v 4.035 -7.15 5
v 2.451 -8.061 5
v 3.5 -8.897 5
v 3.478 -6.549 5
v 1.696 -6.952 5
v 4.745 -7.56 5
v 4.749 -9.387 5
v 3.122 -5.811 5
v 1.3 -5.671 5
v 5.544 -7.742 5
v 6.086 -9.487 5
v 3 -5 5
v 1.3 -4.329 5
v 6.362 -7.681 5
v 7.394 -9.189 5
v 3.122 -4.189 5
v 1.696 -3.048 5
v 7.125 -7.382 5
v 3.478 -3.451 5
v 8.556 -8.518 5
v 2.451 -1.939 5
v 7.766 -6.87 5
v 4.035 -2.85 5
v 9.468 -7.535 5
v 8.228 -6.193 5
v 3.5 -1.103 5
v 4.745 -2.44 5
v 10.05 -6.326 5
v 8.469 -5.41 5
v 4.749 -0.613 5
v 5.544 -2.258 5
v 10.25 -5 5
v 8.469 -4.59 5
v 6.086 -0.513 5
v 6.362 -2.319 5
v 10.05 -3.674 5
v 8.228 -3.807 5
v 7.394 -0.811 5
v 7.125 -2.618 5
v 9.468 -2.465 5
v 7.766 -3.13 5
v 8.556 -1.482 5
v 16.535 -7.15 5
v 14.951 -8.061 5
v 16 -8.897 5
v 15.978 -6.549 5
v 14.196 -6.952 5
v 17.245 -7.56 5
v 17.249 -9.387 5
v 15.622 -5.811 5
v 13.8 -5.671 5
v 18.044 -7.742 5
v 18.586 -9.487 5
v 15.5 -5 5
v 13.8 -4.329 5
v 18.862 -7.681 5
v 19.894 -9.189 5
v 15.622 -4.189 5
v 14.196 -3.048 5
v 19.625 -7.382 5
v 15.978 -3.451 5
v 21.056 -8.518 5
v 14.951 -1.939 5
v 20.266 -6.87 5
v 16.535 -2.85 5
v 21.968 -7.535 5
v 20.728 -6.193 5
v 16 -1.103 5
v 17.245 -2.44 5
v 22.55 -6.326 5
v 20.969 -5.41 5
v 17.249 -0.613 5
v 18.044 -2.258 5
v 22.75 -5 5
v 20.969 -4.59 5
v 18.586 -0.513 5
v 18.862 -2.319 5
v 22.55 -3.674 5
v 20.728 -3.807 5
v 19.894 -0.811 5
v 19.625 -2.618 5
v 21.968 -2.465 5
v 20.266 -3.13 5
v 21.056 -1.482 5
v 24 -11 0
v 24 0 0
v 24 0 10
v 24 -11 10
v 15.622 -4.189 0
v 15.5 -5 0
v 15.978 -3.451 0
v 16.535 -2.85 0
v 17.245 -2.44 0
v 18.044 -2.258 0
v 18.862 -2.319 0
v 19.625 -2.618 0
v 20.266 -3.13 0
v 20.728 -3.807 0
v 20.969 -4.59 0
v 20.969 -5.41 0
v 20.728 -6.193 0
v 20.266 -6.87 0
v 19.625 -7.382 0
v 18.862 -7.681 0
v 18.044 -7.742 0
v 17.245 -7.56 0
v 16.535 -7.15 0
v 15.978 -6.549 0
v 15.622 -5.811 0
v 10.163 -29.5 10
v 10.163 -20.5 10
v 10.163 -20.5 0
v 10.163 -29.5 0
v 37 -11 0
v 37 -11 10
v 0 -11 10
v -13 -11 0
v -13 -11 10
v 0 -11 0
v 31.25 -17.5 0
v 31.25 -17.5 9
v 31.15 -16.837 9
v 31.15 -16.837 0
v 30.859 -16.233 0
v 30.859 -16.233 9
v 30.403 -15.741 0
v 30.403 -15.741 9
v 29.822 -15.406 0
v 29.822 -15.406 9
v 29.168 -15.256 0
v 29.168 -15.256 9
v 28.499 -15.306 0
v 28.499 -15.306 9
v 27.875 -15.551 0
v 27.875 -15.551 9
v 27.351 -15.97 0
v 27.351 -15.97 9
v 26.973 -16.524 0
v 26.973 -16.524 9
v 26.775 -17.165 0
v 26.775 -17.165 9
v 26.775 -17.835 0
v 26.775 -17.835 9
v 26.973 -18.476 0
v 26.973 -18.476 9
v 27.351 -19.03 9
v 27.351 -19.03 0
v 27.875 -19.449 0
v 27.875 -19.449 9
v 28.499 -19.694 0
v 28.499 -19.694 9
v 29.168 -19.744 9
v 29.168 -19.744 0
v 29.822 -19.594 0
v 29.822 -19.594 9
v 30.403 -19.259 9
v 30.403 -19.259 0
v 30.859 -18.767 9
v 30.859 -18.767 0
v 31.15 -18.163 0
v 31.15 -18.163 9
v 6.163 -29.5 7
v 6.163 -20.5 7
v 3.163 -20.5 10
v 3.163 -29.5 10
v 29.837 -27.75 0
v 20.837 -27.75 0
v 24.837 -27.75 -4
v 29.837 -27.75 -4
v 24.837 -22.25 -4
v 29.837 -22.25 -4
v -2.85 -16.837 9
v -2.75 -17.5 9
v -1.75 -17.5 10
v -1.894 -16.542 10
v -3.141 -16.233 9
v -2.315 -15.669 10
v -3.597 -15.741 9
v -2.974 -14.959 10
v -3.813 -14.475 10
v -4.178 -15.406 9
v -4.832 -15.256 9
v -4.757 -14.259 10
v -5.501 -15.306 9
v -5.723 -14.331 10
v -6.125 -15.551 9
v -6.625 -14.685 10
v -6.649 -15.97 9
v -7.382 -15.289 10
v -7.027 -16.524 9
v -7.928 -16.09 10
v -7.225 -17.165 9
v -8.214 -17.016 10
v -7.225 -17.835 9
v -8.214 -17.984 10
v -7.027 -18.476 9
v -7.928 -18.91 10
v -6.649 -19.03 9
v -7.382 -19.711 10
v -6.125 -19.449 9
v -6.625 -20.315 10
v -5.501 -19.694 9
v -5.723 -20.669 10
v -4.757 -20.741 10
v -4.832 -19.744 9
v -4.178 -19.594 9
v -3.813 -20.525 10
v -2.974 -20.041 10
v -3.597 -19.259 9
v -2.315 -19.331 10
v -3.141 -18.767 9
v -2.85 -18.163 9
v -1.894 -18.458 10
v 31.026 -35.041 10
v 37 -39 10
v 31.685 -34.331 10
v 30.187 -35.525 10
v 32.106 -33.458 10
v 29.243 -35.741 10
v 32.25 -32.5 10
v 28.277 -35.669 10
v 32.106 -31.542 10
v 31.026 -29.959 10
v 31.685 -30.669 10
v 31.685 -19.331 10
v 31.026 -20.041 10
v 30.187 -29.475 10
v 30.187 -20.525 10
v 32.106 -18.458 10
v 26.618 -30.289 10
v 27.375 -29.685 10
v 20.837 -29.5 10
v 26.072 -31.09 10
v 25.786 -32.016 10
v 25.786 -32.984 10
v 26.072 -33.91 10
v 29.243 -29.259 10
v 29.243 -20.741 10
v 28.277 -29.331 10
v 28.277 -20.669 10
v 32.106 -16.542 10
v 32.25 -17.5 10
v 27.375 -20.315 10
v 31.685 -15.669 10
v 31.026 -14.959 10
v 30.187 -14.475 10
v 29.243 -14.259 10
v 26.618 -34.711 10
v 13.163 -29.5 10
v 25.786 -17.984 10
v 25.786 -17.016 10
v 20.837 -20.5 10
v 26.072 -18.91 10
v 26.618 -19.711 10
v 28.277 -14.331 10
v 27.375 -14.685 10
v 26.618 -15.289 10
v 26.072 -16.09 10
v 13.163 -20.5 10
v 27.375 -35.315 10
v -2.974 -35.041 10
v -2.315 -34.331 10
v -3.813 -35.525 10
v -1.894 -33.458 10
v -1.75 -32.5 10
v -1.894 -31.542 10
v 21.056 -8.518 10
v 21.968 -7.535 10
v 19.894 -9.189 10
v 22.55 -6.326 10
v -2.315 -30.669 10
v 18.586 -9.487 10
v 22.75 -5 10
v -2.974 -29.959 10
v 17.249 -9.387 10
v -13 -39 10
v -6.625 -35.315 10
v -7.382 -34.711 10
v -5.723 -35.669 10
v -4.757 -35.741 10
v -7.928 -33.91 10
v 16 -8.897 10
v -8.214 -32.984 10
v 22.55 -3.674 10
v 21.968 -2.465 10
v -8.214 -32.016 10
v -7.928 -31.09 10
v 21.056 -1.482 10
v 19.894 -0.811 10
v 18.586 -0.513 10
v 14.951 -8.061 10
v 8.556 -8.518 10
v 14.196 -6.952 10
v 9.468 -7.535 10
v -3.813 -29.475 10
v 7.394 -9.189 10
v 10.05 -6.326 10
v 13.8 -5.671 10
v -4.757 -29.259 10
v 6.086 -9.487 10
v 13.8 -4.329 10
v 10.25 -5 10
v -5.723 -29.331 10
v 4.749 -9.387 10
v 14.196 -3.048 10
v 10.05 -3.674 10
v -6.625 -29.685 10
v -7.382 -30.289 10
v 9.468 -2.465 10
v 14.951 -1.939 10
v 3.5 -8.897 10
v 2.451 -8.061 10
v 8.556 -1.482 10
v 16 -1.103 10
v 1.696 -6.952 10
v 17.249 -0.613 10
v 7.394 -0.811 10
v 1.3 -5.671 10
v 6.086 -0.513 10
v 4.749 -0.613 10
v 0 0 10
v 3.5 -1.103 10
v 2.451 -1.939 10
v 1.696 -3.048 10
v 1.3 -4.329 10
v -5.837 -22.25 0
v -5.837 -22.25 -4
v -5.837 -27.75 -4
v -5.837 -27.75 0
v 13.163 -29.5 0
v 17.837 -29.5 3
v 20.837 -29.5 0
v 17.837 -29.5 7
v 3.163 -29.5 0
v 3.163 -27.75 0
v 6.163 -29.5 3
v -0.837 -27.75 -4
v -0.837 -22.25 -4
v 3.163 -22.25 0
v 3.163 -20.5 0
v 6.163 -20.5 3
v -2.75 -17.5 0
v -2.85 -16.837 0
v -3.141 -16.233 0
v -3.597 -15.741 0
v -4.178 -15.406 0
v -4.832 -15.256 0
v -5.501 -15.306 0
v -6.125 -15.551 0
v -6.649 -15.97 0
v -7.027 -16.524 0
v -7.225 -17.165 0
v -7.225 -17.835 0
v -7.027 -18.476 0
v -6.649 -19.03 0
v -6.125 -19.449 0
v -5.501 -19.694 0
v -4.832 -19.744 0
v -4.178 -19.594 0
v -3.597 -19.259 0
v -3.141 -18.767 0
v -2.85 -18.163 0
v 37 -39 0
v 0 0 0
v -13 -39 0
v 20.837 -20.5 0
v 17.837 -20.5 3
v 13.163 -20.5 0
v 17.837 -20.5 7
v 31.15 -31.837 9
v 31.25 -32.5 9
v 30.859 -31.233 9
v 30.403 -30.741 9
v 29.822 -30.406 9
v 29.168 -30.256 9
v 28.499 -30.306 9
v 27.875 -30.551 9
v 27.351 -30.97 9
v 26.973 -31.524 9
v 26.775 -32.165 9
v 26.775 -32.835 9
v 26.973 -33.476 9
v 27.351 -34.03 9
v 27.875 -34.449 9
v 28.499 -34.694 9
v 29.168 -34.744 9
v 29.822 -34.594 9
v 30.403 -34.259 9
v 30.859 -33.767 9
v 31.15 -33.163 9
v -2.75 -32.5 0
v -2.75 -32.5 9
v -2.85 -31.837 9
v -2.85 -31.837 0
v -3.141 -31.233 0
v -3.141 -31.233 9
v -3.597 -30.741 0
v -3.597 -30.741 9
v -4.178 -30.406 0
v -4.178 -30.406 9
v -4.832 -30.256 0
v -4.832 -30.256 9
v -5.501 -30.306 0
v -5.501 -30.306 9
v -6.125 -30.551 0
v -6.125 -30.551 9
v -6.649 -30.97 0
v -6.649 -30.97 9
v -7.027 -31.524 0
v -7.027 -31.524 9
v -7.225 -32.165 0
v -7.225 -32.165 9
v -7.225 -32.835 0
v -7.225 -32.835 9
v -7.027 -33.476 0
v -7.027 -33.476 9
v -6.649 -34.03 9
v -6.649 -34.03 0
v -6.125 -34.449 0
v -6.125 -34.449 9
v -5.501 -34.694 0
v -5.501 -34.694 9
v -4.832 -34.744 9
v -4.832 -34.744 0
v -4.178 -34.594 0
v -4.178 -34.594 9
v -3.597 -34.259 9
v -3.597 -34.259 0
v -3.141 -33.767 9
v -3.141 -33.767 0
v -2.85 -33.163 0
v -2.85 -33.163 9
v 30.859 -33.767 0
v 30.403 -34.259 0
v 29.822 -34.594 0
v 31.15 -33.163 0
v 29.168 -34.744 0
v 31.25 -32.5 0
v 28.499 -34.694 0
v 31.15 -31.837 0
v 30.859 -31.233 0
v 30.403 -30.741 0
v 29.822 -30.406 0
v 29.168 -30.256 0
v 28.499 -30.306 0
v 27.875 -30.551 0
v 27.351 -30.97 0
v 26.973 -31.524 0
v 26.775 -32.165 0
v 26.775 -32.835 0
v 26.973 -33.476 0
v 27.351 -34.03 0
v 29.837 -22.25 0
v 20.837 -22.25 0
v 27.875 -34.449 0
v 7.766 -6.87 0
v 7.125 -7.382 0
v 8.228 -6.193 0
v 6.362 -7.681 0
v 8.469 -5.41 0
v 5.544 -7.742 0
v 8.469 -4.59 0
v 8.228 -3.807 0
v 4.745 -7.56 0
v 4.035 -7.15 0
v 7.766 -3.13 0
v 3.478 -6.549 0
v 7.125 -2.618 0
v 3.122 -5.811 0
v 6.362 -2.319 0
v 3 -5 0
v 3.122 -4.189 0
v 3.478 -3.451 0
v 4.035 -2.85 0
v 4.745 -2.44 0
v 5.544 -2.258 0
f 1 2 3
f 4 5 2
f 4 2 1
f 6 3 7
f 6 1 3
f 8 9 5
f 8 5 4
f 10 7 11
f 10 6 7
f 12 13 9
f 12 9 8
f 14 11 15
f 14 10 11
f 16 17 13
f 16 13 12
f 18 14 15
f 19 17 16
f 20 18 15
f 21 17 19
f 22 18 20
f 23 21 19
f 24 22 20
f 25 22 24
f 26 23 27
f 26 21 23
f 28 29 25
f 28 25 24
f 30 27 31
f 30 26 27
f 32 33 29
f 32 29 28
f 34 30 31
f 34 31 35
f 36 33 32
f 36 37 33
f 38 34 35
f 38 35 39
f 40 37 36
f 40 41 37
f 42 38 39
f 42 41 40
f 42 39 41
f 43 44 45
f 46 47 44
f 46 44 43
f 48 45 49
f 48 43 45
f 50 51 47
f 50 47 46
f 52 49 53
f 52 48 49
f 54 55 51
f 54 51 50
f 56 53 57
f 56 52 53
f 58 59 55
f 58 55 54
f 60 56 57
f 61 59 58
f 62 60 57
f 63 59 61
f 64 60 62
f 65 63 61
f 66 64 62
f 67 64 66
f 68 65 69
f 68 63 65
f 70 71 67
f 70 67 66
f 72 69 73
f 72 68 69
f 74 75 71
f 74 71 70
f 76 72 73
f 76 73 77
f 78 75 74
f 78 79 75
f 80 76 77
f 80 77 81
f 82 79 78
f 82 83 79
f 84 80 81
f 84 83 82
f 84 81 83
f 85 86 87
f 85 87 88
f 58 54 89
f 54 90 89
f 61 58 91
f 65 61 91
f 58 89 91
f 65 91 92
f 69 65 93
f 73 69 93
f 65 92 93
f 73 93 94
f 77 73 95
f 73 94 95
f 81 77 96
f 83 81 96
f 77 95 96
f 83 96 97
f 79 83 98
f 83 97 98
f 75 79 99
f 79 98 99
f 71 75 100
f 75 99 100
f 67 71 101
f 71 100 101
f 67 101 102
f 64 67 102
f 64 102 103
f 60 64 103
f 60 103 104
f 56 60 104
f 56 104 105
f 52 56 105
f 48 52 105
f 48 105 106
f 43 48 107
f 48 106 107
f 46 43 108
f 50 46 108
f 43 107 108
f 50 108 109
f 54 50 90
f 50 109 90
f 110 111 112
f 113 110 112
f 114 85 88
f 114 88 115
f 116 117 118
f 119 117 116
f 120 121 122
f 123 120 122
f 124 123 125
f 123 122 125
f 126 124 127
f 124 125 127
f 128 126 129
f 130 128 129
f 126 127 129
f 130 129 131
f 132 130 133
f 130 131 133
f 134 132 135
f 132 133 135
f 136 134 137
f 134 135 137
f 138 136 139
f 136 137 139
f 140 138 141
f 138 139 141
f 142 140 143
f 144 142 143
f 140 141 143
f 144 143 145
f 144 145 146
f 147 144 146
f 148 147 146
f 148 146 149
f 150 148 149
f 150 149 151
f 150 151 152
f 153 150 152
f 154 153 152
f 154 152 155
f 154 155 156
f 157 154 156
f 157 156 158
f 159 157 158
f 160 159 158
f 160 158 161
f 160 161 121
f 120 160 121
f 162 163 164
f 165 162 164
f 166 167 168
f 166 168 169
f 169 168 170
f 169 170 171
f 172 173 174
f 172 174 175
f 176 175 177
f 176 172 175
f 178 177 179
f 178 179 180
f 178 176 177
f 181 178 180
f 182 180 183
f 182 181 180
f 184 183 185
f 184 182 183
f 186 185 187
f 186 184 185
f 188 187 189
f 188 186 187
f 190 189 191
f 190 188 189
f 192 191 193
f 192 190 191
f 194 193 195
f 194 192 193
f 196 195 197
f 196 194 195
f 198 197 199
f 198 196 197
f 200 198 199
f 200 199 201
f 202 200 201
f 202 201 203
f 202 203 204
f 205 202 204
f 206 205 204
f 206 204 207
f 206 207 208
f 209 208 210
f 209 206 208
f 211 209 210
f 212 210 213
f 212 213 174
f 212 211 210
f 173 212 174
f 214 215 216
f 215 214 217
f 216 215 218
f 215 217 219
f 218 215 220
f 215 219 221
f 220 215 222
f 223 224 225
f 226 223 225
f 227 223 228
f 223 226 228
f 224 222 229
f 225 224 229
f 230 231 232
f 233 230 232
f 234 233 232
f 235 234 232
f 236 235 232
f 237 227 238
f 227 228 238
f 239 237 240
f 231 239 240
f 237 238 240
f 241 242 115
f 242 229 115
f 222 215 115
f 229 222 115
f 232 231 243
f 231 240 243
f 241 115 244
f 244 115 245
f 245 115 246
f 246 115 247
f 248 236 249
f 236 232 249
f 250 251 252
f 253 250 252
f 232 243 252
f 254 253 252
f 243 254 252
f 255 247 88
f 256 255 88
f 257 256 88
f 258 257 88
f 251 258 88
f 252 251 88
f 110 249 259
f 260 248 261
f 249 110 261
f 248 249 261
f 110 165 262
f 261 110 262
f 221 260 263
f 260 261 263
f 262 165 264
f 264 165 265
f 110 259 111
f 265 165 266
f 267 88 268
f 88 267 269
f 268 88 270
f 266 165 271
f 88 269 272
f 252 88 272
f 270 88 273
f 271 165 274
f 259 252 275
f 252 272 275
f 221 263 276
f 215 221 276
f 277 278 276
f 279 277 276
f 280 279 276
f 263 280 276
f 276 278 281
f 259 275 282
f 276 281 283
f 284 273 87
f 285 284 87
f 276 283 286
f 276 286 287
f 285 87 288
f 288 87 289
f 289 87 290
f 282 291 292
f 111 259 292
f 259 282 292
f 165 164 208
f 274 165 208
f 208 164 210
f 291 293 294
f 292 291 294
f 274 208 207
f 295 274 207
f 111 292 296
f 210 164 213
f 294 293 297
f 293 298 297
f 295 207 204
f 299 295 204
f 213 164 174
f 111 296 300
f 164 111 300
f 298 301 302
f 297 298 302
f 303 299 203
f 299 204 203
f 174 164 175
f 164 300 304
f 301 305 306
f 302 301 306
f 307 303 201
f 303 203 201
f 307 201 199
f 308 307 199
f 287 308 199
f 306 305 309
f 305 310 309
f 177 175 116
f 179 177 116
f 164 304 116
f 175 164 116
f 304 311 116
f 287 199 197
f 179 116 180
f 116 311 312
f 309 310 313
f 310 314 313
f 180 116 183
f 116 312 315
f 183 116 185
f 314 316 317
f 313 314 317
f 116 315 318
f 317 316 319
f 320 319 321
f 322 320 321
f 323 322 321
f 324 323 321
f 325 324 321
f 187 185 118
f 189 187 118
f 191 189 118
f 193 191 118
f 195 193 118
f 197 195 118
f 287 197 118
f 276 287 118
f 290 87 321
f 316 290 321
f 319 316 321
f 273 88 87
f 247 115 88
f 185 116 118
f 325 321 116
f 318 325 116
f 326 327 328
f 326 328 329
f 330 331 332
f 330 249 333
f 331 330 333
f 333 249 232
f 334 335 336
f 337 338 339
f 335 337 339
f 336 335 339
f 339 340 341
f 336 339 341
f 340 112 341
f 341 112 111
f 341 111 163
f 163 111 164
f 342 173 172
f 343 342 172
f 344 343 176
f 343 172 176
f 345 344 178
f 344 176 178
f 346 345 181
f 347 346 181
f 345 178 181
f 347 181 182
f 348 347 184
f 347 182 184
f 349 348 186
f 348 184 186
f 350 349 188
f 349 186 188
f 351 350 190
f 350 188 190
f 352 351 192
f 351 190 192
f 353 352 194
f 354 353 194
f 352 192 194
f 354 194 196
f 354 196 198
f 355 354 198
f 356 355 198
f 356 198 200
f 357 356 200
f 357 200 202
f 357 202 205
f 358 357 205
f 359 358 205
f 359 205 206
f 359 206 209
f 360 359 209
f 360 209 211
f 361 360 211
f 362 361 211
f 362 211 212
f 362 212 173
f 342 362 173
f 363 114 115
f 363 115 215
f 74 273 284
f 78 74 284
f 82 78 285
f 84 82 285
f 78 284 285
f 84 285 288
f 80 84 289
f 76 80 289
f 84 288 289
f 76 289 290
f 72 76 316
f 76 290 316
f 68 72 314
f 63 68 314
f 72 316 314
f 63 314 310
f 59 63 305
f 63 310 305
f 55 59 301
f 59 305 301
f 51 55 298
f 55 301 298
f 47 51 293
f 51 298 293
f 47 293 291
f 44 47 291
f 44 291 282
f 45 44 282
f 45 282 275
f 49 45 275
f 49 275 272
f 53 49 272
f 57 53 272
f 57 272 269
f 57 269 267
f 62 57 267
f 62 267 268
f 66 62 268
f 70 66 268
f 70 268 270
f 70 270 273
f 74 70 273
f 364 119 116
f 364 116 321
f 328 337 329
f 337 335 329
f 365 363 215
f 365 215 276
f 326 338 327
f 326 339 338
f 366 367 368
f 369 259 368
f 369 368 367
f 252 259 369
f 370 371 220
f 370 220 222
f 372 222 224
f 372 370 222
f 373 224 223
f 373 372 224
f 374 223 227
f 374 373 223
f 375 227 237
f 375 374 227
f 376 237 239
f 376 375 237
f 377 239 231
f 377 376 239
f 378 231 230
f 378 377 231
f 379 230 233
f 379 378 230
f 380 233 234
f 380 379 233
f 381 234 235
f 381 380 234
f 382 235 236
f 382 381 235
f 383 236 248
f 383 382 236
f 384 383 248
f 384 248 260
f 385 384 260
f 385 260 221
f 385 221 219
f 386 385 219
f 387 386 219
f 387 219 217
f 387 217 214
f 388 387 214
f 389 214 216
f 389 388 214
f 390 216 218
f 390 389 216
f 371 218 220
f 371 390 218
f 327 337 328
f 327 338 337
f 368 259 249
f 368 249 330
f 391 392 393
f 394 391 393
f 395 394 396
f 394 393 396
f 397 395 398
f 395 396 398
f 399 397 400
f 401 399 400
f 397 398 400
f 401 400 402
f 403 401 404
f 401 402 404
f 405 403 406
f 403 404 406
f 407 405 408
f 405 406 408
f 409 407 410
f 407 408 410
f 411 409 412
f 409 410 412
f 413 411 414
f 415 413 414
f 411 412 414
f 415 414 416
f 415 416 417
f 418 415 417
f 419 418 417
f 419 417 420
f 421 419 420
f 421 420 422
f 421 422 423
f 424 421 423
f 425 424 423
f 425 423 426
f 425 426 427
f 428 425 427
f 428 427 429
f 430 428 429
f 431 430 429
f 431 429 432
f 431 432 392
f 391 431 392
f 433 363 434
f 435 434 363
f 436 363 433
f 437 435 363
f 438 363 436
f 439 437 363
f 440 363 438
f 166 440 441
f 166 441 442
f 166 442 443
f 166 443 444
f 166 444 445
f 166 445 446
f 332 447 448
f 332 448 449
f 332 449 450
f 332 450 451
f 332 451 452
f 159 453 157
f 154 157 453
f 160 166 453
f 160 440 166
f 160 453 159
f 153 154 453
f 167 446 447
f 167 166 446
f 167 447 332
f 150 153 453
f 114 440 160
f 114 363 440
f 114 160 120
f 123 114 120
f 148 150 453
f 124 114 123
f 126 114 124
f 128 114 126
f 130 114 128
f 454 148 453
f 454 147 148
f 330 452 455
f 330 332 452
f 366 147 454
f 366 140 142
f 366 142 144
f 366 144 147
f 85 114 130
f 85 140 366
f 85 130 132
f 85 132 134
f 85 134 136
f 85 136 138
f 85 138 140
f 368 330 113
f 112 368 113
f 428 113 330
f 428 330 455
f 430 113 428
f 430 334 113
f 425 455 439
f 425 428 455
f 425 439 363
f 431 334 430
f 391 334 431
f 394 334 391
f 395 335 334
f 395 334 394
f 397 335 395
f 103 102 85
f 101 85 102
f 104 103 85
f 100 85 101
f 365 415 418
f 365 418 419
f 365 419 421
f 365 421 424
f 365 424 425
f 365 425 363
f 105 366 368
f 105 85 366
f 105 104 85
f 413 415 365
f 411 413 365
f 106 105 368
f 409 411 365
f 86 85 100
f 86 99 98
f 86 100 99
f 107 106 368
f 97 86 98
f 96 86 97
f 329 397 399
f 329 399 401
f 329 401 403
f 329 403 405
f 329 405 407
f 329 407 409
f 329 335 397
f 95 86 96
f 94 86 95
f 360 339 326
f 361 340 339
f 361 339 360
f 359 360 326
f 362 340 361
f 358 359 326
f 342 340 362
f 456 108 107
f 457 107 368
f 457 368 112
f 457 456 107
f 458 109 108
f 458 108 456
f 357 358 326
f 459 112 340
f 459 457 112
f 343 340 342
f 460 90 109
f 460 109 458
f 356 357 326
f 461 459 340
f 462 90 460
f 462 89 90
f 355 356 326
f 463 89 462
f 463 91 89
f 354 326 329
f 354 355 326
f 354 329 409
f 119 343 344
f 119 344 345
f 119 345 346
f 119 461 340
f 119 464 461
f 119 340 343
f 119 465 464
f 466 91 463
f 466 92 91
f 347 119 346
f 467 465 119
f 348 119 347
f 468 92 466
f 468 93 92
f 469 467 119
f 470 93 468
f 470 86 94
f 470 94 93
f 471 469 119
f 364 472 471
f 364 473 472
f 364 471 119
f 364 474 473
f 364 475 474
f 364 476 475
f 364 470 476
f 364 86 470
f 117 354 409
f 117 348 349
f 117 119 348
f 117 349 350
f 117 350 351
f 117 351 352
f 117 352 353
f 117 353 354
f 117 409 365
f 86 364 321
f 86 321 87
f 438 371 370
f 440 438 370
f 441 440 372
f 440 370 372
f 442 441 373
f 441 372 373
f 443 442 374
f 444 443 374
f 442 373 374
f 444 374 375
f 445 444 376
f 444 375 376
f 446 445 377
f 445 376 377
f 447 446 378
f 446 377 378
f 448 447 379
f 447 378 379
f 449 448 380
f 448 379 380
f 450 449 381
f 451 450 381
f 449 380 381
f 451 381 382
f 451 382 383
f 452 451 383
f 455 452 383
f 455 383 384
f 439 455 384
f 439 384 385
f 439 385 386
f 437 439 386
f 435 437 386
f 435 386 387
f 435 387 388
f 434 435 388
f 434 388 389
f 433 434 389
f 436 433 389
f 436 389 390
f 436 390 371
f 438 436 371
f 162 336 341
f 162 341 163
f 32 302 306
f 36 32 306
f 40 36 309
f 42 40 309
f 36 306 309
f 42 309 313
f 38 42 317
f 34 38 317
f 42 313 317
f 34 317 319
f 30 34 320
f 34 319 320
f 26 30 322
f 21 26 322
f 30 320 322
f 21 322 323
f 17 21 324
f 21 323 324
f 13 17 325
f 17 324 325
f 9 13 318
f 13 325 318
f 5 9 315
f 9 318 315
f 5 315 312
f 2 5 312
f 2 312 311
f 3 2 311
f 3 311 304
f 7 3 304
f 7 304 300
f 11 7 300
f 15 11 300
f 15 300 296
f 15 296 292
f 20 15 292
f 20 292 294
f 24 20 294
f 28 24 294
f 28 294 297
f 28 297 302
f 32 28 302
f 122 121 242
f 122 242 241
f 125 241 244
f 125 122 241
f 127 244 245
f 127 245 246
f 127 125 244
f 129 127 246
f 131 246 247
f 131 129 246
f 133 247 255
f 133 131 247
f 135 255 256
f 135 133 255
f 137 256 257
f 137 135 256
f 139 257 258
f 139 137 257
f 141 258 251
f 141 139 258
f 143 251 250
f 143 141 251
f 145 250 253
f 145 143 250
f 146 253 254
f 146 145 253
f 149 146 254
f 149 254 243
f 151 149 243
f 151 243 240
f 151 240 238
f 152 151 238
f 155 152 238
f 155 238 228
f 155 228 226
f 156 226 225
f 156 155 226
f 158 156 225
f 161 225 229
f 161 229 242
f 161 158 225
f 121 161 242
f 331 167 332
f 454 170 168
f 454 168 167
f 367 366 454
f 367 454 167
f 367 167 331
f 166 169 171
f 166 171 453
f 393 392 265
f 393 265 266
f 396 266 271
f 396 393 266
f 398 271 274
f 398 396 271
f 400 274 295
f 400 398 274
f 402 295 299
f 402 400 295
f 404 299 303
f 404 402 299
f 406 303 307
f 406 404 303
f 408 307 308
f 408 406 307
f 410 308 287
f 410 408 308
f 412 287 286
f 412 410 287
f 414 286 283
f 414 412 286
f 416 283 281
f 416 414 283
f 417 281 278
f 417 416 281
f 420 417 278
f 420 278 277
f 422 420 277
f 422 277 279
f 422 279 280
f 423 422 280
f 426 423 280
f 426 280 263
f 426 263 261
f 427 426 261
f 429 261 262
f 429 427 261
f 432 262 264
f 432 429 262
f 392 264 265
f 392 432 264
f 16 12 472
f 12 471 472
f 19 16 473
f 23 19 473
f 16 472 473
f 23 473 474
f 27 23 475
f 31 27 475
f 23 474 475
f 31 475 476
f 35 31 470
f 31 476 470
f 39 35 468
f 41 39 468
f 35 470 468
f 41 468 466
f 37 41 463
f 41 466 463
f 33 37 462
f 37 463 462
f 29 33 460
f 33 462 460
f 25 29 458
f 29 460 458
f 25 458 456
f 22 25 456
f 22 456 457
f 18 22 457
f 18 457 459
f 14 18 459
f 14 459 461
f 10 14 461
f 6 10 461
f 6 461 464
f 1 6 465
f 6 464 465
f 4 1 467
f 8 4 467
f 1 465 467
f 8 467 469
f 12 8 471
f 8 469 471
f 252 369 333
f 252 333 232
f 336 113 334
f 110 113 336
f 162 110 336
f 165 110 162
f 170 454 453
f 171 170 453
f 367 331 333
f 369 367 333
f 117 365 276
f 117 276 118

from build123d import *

# Parameters (mm, degrees)
PAD_DEPTH        = 10
HOLE_D           = 5.5
HOLE_CBORE_D     = 9
HOLE_CBORE_DEPTH = 5
POCKET_DEPTH     = 9
SKETCH004_R      = 2.25
HOLE001_DEPTH    = 10.001
CHAMFER_SIZE     = 1
PAD001_DEPTH     = 2.75


with BuildPart() as part:
    # Sketch → Pad (new body)
    with BuildSketch(Plane.XY):
        Polygon((0, 0), (24, 0), (24, -11), (37, -11), (37, -39), (-13, -39), (-13, -11), (0, -11), align=None)
    extrude(amount=PAD_DEPTH)

    # Hole (through all)
    with Locations(Plane.XY.offset(10)):
        with Locations((5.75, -5), (18.25, -5)):
            CounterBoreHole(HOLE_D / 2, HOLE_CBORE_D / 2, HOLE_CBORE_DEPTH)

    # Sketch003 (on Face6 of Hole) → Pocket (cut)
    with BuildSketch(Plane(origin=(0, -20.5, 0), x_dir=(-1, 0, 0), z_dir=(0, 1, 0))):
        Polygon((-3.163025, 0), (-6.163025, 3), (-6.163025, 7), (-3.163025, 10), (-10.163025, 10), (-10.163025, 0), align=None)
        Polygon((-20.836975, 10), (-13.163025, 10), (-13.163025, 0), (-20.836975, 0), (-17.836975, 3), (-17.836975, 7), align=None)
    extrude(amount=-POCKET_DEPTH, mode=Mode.SUBTRACT)

    # Sketch004 (on Face5 of Pocket) → Hole001 (cut, through all)
    with BuildSketch(Plane.XY.offset(10)):
        with Locations((-5, -17.5)):
            Circle(SKETCH004_R)
        with Locations((-5, -32.5)):
            Circle(SKETCH004_R)
        with Locations((29, -32.5)):
            Circle(SKETCH004_R)
        with Locations((29, -17.5)):
            Circle(SKETCH004_R)
    extrude(amount=-HOLE001_DEPTH, mode=Mode.SUBTRACT)

    # Chamfer
    chamfer_edges = [part.edges().sort_by_distance(p)[0] for p in [
        (-7.25, -17.5, 10),
        (-7.25, -32.5, 10),
        (26.75, -17.5, 10),
        (26.75, -32.5, 10),
    ]]
    chamfer(chamfer_edges, length=CHAMFER_SIZE)

    # Sketch005 → Pad001 (join, symmetric)
    with BuildSketch(Plane.XZ.offset(25)):
        Polygon((-0.836975, -4), (-5.836975, -4), (-5.836975, 0), (3.163025, 0), align=None)
        Polygon((20.836975, 0), (24.836975, -4), (29.836975, -4), (29.836975, 0), align=None)
    extrude(amount=PAD001_DEPTH, both=True)


solid = part.part
